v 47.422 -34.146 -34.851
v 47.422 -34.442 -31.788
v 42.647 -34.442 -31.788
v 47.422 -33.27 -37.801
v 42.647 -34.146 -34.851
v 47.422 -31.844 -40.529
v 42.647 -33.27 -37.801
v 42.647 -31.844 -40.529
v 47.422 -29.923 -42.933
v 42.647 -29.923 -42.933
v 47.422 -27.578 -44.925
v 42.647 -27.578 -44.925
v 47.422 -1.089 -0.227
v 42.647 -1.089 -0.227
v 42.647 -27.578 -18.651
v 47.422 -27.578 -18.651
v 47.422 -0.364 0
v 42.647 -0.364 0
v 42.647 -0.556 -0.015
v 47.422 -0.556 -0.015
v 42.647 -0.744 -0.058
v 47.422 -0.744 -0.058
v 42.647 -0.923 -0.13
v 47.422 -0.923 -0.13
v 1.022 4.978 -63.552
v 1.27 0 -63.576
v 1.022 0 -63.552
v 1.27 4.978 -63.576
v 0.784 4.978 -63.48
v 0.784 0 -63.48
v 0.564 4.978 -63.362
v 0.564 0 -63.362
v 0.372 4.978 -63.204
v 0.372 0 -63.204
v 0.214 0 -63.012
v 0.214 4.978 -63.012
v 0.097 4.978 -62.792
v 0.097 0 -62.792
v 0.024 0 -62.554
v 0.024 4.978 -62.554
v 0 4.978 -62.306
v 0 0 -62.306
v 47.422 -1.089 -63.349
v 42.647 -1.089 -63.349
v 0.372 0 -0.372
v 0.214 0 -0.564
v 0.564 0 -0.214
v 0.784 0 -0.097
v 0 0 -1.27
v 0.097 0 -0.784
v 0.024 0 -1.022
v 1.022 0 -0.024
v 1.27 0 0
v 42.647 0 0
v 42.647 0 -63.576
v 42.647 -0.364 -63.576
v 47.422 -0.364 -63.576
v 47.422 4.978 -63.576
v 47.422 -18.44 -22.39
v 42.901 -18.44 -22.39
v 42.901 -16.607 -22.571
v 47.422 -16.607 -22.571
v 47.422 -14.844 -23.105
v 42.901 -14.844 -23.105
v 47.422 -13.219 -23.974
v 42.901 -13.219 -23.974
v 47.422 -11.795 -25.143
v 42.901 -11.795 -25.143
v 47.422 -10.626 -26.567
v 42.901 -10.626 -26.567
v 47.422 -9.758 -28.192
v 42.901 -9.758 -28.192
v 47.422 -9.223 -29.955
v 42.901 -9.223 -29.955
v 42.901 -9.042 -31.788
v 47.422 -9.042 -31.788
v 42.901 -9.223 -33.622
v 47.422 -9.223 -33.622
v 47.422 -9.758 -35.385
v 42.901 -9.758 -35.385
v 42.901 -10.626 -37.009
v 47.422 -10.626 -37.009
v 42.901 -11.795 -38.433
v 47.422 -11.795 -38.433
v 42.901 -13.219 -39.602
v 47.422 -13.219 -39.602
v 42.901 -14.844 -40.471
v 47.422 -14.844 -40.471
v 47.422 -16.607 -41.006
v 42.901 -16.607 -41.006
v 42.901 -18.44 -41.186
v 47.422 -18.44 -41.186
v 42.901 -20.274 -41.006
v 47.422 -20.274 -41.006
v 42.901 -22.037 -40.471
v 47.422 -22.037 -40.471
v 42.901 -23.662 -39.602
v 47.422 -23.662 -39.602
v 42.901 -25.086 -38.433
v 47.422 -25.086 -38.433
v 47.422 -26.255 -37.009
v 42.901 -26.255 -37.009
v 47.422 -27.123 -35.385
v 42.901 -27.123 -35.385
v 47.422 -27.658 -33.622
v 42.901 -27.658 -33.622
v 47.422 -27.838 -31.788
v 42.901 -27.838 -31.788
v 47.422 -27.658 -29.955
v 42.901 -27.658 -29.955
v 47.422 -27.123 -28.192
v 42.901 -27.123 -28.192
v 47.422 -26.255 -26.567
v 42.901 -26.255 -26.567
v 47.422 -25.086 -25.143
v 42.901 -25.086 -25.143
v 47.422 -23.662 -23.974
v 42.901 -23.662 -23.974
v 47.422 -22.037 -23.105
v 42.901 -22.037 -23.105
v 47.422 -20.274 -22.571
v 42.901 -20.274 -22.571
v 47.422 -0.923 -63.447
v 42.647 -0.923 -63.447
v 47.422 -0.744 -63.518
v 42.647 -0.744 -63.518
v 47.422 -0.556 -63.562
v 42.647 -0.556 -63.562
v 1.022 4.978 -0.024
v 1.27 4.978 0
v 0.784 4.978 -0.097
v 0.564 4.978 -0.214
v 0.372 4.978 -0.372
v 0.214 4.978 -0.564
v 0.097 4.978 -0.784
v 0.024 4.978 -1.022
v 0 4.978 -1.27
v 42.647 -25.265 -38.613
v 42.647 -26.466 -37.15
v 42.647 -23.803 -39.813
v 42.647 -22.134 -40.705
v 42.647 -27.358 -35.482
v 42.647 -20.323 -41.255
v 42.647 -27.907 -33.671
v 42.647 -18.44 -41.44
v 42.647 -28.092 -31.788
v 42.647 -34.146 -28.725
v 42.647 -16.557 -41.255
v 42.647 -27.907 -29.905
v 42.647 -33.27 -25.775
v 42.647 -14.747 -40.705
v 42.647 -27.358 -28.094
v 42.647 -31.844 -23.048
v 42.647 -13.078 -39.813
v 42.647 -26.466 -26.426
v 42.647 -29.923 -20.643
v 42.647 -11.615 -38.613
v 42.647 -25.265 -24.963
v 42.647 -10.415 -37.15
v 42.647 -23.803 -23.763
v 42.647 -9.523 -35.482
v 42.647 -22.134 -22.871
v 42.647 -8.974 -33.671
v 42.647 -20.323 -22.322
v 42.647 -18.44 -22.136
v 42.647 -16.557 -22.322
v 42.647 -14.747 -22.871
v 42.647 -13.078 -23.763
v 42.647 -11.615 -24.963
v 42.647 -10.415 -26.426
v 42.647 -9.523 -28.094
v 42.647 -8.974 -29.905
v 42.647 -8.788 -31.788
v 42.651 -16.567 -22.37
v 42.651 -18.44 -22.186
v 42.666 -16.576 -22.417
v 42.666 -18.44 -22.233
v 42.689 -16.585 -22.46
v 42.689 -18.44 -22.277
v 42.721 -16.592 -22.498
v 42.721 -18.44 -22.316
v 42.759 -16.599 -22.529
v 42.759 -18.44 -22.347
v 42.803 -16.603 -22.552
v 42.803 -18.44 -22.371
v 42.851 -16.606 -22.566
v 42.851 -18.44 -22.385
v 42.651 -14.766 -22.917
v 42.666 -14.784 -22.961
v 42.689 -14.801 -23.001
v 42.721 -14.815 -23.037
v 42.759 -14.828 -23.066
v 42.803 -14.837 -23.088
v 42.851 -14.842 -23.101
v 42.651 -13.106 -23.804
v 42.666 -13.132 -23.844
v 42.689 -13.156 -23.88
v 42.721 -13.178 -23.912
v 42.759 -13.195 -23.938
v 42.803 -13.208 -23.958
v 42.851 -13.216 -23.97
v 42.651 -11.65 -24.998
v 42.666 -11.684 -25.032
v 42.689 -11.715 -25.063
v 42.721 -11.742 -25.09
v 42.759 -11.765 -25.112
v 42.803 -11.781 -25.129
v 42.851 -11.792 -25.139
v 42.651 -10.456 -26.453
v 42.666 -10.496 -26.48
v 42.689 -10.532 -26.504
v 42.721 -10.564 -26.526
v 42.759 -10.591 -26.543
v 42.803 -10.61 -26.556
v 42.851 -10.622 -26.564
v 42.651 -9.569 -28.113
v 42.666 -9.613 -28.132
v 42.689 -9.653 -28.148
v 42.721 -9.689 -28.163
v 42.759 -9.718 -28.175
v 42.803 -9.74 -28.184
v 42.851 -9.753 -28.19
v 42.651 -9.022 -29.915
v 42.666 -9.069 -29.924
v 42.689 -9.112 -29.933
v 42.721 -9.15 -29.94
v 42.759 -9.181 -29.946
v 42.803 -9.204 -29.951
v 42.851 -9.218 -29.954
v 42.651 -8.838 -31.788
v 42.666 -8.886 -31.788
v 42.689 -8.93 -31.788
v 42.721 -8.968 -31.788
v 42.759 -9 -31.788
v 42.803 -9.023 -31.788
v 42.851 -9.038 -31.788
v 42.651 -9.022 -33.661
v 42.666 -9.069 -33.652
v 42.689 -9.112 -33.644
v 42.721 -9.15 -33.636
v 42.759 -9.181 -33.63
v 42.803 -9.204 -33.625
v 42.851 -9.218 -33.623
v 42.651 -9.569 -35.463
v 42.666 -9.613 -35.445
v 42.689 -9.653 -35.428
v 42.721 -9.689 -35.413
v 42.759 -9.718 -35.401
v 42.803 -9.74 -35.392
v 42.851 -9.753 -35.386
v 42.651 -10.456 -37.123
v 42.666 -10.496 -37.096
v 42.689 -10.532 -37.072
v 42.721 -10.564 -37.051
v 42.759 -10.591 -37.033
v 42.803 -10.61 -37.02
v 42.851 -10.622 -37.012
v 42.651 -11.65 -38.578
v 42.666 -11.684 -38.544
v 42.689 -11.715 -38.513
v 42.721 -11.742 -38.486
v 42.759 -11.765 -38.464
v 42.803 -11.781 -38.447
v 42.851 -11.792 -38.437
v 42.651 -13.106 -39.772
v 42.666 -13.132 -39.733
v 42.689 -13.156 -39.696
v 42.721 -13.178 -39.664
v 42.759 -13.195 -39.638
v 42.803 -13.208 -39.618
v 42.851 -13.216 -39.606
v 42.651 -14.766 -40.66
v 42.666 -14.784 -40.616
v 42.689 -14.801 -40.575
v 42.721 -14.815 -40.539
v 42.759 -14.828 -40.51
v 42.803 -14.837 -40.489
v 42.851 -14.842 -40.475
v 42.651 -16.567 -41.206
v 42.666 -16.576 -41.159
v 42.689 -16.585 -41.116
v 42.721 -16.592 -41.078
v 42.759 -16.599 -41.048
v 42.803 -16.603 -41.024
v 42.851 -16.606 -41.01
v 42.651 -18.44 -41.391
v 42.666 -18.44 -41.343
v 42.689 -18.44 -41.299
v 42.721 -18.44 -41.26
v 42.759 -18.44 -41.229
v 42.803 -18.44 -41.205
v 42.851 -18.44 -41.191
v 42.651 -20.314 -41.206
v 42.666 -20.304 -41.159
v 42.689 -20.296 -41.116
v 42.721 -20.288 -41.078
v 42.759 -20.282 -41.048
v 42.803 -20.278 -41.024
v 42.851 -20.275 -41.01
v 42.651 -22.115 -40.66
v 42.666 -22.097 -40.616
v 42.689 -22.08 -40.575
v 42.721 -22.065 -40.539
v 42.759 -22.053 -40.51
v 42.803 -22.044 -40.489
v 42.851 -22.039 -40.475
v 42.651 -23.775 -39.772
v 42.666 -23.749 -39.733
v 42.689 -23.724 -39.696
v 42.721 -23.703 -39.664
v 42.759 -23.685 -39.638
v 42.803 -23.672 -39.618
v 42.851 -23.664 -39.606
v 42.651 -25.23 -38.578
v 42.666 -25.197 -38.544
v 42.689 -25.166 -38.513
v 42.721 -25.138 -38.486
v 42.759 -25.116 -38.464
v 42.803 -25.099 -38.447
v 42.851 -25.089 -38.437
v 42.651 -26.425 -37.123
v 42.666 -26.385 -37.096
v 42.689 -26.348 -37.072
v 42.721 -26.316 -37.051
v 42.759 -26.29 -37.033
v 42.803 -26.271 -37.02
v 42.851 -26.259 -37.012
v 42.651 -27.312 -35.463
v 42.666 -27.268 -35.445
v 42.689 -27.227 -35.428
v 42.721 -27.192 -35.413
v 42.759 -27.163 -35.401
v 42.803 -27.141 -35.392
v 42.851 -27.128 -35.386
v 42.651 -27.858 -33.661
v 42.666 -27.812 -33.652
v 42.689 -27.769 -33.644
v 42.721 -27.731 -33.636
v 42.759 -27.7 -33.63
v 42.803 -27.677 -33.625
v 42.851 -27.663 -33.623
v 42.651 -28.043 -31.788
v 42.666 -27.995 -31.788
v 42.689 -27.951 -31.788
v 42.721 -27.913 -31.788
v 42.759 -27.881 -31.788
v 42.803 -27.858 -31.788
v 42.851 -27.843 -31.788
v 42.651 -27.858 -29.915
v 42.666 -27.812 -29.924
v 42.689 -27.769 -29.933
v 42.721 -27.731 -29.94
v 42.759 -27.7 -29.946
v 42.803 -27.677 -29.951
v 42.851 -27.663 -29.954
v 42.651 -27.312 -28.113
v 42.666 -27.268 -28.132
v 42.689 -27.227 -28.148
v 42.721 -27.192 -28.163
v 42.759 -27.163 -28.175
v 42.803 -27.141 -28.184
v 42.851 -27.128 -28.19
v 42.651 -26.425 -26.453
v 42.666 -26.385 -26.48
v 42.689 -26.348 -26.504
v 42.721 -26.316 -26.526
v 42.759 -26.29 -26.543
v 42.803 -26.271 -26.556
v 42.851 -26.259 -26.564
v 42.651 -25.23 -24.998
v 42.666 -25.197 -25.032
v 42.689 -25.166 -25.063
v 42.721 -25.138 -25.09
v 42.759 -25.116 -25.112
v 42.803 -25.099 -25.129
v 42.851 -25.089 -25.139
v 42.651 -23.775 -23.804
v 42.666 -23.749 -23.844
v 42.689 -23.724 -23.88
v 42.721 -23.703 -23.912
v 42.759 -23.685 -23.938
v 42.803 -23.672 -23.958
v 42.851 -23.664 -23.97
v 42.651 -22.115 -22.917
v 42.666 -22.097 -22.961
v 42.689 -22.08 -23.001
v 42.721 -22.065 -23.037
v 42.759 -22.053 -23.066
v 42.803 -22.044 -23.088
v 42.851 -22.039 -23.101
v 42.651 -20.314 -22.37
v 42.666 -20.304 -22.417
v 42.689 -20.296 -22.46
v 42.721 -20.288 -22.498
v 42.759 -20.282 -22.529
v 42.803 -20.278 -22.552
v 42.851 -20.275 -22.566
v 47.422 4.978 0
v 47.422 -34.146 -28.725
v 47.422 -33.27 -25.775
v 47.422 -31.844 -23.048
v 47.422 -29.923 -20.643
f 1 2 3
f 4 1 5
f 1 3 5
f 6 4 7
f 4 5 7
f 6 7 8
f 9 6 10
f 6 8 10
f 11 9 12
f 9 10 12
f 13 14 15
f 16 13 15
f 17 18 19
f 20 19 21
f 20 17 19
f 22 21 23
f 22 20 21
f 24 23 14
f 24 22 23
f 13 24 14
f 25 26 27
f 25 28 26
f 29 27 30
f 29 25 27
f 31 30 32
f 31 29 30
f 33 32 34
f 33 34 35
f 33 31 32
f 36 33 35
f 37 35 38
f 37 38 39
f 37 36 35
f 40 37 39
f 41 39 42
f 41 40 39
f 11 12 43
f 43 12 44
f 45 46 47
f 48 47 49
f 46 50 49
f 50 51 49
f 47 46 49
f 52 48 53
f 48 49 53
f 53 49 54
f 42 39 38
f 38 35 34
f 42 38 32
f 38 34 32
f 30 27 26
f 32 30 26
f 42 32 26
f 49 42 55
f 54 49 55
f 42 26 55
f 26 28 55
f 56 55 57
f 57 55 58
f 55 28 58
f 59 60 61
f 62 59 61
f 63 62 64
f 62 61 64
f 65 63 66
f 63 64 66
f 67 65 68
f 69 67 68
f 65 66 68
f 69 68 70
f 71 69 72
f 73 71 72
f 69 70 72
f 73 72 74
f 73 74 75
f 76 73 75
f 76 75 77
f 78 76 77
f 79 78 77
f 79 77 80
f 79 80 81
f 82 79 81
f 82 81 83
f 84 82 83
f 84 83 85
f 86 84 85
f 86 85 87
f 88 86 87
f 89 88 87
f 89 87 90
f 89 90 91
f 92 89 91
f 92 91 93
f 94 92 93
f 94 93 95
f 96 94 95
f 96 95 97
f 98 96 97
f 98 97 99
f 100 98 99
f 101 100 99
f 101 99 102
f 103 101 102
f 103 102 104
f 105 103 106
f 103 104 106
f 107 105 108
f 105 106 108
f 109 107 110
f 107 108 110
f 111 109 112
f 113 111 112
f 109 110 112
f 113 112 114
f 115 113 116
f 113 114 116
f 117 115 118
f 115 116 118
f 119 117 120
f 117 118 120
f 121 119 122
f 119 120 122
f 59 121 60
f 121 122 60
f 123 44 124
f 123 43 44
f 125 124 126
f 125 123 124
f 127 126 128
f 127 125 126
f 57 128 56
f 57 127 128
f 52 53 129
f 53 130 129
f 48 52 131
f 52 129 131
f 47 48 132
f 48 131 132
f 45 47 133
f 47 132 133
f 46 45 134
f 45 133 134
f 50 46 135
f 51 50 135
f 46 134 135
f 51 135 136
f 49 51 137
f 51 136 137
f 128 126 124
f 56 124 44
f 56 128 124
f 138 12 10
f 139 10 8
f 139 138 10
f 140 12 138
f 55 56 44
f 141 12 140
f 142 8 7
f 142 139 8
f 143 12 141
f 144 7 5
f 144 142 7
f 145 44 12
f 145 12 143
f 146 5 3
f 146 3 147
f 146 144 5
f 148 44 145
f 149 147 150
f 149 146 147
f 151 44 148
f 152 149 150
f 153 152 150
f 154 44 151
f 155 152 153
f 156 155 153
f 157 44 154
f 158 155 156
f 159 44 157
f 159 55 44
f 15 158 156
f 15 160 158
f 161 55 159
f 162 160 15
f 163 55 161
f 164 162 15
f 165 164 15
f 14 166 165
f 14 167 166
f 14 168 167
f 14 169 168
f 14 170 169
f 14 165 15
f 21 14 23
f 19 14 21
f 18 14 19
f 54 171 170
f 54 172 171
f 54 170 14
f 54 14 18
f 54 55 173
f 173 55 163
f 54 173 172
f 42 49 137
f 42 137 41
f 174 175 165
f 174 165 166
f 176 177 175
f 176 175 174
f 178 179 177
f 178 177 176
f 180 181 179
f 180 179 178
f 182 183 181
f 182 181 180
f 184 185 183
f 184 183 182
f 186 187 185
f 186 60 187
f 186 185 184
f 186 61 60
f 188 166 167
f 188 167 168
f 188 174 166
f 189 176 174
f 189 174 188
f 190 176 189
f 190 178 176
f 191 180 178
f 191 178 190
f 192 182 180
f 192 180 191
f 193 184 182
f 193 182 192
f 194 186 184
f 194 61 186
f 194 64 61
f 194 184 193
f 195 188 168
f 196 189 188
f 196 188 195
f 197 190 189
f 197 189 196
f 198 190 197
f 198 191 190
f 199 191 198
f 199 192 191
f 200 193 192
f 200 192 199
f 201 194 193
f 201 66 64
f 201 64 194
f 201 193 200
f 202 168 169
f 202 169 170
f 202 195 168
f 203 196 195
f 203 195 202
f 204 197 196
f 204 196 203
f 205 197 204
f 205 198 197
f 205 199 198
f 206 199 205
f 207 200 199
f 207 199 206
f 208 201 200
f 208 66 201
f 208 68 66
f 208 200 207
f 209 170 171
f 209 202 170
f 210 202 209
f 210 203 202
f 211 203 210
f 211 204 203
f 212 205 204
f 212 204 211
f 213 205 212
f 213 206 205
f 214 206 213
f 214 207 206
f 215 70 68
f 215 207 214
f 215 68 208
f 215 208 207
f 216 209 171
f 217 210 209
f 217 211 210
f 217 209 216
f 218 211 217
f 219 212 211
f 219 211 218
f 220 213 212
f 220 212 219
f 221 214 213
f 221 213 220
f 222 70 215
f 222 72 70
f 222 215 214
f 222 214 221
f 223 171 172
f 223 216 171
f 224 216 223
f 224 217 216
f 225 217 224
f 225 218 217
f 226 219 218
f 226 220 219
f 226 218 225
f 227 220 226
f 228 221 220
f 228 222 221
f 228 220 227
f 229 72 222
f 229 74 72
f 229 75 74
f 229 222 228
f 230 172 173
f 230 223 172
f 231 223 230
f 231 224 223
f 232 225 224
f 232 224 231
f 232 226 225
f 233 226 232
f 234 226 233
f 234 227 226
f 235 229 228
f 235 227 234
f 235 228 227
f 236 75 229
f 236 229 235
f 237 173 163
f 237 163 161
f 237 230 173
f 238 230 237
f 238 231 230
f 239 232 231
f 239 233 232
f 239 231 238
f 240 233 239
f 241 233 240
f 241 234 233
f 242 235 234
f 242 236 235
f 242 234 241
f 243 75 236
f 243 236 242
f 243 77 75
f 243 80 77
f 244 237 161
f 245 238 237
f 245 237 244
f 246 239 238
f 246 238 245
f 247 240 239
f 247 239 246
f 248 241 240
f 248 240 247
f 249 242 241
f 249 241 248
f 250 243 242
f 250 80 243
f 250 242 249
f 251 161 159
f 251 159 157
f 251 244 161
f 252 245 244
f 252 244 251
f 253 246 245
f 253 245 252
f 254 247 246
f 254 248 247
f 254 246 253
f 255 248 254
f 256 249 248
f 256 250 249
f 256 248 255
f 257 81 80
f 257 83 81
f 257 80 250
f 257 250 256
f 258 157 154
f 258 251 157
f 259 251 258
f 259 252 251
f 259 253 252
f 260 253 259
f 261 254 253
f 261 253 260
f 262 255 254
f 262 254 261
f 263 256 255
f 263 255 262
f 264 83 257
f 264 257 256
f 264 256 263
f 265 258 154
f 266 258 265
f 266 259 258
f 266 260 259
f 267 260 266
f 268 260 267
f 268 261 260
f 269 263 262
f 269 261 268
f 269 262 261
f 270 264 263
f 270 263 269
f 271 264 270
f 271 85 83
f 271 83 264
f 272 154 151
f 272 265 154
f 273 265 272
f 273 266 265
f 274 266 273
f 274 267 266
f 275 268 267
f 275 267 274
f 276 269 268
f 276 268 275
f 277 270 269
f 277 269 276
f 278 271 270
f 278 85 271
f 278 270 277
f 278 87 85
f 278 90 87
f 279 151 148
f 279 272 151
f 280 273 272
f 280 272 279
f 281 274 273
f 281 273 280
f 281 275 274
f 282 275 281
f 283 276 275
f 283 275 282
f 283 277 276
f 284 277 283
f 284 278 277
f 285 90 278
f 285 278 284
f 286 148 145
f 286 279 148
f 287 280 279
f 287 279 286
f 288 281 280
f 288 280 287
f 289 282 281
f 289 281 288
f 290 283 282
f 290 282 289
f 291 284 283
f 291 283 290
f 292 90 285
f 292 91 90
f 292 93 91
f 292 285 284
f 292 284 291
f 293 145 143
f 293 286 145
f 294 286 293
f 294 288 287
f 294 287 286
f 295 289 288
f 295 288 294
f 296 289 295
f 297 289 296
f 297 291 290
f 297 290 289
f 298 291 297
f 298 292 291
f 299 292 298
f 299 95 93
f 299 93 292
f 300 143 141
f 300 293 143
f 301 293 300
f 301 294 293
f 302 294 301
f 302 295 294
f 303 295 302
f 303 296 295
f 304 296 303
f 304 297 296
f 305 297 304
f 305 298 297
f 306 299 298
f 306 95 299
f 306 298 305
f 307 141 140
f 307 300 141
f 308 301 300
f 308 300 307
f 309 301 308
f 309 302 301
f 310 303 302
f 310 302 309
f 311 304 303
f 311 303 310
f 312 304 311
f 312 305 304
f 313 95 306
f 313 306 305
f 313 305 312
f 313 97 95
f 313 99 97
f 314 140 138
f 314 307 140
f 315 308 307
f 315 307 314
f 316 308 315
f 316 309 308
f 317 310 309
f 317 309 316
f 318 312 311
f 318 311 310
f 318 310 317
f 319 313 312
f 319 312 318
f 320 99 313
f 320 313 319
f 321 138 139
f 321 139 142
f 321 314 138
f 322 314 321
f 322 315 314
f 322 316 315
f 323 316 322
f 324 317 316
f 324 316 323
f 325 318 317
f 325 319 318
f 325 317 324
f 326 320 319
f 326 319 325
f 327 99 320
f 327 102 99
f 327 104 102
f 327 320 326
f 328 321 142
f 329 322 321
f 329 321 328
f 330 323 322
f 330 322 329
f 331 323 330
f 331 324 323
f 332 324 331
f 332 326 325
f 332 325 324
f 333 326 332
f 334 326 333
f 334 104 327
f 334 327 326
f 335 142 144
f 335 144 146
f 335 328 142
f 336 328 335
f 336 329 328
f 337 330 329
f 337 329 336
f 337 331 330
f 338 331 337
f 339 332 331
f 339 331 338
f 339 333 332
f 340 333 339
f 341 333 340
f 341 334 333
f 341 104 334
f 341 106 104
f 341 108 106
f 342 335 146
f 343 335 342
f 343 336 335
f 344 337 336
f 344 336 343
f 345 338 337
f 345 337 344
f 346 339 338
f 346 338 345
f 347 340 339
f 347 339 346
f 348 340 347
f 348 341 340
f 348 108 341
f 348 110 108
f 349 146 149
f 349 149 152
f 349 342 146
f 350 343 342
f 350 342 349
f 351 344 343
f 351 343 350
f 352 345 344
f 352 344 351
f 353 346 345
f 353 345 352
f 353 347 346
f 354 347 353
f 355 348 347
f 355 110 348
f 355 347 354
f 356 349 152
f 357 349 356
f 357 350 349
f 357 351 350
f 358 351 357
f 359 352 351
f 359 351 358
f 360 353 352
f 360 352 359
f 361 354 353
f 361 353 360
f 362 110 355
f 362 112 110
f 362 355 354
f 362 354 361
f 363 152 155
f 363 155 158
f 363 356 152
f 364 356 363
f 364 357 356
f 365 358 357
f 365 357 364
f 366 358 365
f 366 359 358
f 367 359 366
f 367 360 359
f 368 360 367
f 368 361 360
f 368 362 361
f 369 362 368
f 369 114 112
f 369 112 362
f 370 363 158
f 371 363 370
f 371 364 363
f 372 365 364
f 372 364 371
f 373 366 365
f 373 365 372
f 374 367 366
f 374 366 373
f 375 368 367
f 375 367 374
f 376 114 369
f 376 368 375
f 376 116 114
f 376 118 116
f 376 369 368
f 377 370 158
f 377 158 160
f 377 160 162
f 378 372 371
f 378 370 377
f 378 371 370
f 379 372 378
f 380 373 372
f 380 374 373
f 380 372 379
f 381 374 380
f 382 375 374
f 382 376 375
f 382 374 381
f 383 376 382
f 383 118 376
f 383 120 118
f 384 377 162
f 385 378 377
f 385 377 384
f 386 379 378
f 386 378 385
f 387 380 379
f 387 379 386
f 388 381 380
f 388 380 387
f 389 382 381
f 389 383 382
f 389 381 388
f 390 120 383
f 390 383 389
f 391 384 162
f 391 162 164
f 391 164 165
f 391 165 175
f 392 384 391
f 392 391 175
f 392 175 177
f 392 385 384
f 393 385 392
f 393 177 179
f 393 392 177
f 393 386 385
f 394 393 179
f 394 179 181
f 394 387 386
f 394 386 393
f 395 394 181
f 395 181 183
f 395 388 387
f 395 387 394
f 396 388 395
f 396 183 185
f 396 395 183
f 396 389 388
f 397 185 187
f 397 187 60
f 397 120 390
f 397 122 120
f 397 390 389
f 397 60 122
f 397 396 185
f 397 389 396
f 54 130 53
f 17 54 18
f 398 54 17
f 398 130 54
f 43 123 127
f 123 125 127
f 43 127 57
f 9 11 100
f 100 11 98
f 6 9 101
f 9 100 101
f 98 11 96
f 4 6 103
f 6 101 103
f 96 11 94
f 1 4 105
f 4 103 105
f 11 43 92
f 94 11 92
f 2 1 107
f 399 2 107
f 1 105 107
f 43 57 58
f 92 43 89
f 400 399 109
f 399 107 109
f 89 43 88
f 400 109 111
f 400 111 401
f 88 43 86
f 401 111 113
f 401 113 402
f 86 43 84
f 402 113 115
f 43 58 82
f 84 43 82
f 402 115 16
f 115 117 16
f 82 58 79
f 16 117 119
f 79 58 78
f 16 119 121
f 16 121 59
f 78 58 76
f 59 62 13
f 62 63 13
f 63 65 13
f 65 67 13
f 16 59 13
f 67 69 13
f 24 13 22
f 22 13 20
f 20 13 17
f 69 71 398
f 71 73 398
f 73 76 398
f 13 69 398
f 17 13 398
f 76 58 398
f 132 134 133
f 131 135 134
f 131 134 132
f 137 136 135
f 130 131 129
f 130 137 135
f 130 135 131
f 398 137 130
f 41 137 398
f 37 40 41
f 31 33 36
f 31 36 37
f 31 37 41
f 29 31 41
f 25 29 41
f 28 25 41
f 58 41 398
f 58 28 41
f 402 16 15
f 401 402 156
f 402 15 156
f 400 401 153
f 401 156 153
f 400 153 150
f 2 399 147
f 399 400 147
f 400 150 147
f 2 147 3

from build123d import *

# Parameters (mm, degrees)
SKETCH1_W           = 47.4218
SKETCH1_H           = 63.5762
BOSS_EXTRUDE1_DEPTH = 4.9784
SKETCH3_W           = 4.7752
SKETCH3_H           = 63.5762
BOSS_EXTRUDE2_DEPTH = 34.4424
SKETCH4_R           = 9.398
CUT_EXTRUDE1_DEPTH  = 5.7752
FILLET1_R           = 1.27
FILLET2_R           = 1.27
FILLET3_R           = 0.254


with BuildPart() as part:
    # Sketch1 → Boss-Extrude1 (new body)
    with BuildSketch(Plane(origin=(0, 0, 0), x_dir=(1, 0, 0), z_dir=(0, 1, 0))):
        with Locations((23.7109, 31.7881)):
            Rectangle(SKETCH1_W, SKETCH1_H)
    extrude(amount=BOSS_EXTRUDE1_DEPTH)

    # Sketch3 → Boss-Extrude2 (add)
    with BuildSketch(Plane.XZ):
        with Locations((45.0342, -31.7881)):
            Rectangle(SKETCH3_W, SKETCH3_H)
    extrude(amount=BOSS_EXTRUDE2_DEPTH)

    # Sketch4 → Cut-Extrude1 (cut, through all)
    with BuildSketch(Plane.ZY.offset(-42.6466)):
        with BuildLine():
            Line((0, -34.4424), (0, -0.762))
            Line((0, -0.762), (-18.65127846, -27.577572639))
            ThreePointArc((-18.65127846, -27.577572639), (-24.376927103, -32.622731271), (-31.7881, -34.4424))
            Line((-31.7881, -34.4424), (0, -34.4424))
        make_face()
        with BuildLine():
            Line((-44.92492154, -27.577572639), (-63.5762, -0.762))
            Line((-63.5762, -0.762), (-63.5762, -34.4424))
            Line((-63.5762, -34.4424), (-31.7881, -34.4424))
            ThreePointArc((-31.7881, -34.4424), (-39.199272897, -32.622731271), (-44.92492154, -27.577572639))
        make_face()
        with Locations((-31.7881, -18.4404)):
            Circle(SKETCH4_R)
    extrude(amount=-CUT_EXTRUDE1_DEPTH, mode=Mode.SUBTRACT)

    # Fillet1
    fillet1_edges = [part.edges().sort_by_distance(p)[0] for p in [
        (45.0342, -0.762, 0),
        (45.0342, -0.762, -63.5762),
    ]]
    fillet(fillet1_edges, radius=FILLET1_R)

    # Fillet2
    fillet2_edges = [part.edges().sort_by_distance(p)[0] for p in [
        (0, 2.4892, -63.5762),
        (0, 2.4892, 0),
    ]]
    fillet(fillet2_edges, radius=FILLET2_R)

    # Fillet3
    fillet3_edges = [part.edges().sort_by_distance(p)[0] for p in [
        (42.6466, -18.4404, -41.1861),
    ]]
    fillet(fillet3_edges, radius=FILLET3_R)


solid = part.part
